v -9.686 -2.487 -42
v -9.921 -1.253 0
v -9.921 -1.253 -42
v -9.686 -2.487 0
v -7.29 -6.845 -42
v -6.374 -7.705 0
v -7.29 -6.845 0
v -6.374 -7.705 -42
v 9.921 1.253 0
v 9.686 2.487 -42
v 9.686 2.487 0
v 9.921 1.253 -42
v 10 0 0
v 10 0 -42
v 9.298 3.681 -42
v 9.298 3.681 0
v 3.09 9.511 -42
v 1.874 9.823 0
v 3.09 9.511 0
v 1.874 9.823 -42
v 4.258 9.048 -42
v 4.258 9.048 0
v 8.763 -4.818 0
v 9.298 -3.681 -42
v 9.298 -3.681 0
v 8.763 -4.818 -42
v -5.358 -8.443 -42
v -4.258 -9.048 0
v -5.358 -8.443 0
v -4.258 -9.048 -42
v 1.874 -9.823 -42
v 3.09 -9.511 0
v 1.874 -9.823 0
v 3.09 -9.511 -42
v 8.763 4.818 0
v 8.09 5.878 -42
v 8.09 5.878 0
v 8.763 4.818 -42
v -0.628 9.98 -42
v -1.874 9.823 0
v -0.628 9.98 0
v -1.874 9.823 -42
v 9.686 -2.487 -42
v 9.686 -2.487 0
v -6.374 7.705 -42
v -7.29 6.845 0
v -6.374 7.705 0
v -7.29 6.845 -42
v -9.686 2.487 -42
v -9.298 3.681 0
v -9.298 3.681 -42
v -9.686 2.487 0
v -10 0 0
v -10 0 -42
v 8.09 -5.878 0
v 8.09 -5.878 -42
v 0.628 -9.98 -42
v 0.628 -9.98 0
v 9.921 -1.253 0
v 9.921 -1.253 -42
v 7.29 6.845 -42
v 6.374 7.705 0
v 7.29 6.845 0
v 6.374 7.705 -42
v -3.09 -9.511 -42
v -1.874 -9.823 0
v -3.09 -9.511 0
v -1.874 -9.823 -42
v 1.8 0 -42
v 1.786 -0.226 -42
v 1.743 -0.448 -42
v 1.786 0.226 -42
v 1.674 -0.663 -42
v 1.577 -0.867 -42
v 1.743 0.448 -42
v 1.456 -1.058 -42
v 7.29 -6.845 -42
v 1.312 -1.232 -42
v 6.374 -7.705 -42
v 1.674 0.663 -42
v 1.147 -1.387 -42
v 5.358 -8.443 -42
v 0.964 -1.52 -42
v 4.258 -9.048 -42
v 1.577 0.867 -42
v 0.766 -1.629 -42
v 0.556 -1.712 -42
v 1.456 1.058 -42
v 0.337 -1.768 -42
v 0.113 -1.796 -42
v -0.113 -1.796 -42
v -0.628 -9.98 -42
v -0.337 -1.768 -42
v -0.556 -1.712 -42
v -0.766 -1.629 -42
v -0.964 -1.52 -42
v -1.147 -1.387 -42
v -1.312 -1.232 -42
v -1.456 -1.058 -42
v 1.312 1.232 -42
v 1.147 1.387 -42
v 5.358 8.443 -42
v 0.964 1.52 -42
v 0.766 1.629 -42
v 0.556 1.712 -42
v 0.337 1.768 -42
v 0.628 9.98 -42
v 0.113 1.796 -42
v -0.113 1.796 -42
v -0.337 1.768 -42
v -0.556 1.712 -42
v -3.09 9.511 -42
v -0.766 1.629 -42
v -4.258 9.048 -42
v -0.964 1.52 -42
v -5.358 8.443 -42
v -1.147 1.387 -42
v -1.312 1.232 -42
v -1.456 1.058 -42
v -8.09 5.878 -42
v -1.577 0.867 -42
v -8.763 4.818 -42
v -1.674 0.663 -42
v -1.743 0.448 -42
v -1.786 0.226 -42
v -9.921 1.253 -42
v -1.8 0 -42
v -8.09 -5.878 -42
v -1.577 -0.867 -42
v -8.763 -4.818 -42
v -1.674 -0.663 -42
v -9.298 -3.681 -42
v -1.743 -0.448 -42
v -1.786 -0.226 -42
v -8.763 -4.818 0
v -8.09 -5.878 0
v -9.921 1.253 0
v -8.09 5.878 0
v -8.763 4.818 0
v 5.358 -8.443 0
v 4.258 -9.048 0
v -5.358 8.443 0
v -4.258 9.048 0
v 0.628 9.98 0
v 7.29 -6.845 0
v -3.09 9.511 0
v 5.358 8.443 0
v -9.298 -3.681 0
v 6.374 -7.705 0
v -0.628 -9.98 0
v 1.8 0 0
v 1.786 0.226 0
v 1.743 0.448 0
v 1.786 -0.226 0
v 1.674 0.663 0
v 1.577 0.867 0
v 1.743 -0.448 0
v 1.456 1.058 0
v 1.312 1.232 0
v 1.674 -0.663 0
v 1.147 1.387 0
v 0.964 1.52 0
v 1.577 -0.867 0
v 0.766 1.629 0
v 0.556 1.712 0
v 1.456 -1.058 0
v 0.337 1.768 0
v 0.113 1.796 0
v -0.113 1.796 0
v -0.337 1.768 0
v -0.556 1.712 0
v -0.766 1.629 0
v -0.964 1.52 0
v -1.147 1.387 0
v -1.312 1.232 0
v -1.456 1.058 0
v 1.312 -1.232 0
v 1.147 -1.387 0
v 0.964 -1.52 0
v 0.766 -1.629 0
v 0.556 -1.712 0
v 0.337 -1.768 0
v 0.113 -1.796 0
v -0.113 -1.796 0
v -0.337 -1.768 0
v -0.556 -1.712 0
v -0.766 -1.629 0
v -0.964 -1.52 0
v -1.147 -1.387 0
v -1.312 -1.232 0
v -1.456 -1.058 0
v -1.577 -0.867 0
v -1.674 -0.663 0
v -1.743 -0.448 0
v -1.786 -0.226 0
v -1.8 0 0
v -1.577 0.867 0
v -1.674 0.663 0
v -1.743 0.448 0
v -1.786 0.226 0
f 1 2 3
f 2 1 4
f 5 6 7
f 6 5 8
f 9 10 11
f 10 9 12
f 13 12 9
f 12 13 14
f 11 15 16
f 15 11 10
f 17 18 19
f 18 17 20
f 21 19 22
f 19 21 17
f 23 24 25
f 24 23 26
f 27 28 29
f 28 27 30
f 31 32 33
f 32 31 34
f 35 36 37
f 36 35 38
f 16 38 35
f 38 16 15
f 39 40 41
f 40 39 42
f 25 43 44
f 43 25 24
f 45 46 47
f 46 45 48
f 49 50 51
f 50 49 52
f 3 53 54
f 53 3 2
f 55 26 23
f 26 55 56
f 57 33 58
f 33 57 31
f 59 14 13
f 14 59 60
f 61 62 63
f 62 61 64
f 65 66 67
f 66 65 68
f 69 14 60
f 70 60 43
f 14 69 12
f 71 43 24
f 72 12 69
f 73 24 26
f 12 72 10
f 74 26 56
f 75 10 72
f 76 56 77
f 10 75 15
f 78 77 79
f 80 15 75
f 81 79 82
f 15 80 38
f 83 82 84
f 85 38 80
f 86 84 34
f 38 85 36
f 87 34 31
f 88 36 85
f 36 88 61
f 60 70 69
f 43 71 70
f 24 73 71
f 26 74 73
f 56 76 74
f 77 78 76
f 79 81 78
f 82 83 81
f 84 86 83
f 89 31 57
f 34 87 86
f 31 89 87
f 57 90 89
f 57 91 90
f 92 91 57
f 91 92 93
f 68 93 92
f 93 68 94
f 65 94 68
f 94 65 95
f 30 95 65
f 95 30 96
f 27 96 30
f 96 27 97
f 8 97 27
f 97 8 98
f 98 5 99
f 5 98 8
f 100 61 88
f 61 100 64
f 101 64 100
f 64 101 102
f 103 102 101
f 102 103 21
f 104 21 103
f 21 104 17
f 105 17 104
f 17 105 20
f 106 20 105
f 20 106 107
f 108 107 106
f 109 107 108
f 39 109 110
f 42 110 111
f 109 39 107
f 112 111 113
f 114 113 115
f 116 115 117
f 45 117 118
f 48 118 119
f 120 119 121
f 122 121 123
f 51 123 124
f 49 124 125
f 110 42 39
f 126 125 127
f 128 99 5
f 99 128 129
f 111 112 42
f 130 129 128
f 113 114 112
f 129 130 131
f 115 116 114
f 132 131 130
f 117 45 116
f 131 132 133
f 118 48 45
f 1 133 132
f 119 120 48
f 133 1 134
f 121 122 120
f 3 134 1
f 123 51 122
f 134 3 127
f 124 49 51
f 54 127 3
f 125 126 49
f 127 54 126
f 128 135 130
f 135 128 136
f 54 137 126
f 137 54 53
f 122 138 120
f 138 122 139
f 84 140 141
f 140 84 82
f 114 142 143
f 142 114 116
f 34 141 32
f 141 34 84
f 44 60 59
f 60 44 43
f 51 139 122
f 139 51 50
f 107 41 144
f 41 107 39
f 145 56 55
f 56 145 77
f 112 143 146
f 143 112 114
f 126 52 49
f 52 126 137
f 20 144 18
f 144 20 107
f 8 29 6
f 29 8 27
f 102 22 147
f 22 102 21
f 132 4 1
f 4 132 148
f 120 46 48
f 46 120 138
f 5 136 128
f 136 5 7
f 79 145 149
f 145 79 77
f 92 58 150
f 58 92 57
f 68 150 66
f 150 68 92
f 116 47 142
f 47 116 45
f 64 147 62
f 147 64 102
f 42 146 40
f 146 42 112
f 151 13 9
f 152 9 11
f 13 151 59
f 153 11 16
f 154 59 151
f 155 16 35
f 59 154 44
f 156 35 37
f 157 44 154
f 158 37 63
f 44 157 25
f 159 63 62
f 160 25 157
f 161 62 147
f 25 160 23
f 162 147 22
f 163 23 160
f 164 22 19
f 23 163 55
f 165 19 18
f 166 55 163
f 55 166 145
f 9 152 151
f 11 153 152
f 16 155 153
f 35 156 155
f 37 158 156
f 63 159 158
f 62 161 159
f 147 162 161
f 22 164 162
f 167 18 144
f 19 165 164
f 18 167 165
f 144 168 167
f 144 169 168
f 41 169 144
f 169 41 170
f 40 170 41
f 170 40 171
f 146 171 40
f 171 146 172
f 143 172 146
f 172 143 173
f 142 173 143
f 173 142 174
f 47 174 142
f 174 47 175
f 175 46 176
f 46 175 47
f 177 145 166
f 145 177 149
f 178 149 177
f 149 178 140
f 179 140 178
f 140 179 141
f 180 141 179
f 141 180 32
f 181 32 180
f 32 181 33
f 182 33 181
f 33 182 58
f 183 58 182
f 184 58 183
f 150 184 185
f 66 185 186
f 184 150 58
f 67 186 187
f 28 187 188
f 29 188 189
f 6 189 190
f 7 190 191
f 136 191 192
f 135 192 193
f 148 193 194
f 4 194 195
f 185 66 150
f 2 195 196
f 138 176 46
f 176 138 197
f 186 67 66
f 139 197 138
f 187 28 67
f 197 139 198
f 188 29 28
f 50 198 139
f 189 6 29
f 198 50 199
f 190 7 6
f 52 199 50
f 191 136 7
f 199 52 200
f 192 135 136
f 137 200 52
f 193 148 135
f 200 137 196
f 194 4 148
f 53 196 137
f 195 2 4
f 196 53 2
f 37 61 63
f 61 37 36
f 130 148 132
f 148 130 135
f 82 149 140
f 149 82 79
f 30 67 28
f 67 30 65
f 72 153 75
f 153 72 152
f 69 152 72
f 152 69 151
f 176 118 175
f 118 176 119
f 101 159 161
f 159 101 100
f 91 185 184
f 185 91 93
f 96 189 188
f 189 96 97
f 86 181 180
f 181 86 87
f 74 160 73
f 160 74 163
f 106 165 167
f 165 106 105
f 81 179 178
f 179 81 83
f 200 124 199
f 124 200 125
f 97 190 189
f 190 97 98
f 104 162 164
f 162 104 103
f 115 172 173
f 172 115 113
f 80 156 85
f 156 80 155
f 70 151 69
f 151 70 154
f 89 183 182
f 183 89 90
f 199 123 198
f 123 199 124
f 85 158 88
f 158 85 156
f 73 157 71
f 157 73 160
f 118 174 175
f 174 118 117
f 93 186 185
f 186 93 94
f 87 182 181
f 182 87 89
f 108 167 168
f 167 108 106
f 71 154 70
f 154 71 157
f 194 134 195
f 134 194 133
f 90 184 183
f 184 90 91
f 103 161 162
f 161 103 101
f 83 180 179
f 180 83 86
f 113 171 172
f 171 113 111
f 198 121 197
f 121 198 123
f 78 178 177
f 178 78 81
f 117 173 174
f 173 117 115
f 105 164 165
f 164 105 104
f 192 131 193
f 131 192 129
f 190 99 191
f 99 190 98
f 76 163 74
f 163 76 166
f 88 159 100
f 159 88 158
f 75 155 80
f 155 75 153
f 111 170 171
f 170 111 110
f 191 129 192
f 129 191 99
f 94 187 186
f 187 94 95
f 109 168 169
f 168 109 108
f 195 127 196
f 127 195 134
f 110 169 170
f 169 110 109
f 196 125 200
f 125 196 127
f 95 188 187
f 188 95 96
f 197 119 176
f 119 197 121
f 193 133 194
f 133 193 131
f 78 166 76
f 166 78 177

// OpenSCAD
$fn = 50;


difference() {
	union() {
		translate(v = [0, 0, -42.0000000000]) {
			cylinder(h = 42, r = 10.0000000000);
		}
		cylinder(h = 0, r = 13.0000000000);
	}
	union() {
		#translate(v = [0, 0, -42]) {
			cylinder(h = 42, r = 1.8000000000);
		}
	}
}
